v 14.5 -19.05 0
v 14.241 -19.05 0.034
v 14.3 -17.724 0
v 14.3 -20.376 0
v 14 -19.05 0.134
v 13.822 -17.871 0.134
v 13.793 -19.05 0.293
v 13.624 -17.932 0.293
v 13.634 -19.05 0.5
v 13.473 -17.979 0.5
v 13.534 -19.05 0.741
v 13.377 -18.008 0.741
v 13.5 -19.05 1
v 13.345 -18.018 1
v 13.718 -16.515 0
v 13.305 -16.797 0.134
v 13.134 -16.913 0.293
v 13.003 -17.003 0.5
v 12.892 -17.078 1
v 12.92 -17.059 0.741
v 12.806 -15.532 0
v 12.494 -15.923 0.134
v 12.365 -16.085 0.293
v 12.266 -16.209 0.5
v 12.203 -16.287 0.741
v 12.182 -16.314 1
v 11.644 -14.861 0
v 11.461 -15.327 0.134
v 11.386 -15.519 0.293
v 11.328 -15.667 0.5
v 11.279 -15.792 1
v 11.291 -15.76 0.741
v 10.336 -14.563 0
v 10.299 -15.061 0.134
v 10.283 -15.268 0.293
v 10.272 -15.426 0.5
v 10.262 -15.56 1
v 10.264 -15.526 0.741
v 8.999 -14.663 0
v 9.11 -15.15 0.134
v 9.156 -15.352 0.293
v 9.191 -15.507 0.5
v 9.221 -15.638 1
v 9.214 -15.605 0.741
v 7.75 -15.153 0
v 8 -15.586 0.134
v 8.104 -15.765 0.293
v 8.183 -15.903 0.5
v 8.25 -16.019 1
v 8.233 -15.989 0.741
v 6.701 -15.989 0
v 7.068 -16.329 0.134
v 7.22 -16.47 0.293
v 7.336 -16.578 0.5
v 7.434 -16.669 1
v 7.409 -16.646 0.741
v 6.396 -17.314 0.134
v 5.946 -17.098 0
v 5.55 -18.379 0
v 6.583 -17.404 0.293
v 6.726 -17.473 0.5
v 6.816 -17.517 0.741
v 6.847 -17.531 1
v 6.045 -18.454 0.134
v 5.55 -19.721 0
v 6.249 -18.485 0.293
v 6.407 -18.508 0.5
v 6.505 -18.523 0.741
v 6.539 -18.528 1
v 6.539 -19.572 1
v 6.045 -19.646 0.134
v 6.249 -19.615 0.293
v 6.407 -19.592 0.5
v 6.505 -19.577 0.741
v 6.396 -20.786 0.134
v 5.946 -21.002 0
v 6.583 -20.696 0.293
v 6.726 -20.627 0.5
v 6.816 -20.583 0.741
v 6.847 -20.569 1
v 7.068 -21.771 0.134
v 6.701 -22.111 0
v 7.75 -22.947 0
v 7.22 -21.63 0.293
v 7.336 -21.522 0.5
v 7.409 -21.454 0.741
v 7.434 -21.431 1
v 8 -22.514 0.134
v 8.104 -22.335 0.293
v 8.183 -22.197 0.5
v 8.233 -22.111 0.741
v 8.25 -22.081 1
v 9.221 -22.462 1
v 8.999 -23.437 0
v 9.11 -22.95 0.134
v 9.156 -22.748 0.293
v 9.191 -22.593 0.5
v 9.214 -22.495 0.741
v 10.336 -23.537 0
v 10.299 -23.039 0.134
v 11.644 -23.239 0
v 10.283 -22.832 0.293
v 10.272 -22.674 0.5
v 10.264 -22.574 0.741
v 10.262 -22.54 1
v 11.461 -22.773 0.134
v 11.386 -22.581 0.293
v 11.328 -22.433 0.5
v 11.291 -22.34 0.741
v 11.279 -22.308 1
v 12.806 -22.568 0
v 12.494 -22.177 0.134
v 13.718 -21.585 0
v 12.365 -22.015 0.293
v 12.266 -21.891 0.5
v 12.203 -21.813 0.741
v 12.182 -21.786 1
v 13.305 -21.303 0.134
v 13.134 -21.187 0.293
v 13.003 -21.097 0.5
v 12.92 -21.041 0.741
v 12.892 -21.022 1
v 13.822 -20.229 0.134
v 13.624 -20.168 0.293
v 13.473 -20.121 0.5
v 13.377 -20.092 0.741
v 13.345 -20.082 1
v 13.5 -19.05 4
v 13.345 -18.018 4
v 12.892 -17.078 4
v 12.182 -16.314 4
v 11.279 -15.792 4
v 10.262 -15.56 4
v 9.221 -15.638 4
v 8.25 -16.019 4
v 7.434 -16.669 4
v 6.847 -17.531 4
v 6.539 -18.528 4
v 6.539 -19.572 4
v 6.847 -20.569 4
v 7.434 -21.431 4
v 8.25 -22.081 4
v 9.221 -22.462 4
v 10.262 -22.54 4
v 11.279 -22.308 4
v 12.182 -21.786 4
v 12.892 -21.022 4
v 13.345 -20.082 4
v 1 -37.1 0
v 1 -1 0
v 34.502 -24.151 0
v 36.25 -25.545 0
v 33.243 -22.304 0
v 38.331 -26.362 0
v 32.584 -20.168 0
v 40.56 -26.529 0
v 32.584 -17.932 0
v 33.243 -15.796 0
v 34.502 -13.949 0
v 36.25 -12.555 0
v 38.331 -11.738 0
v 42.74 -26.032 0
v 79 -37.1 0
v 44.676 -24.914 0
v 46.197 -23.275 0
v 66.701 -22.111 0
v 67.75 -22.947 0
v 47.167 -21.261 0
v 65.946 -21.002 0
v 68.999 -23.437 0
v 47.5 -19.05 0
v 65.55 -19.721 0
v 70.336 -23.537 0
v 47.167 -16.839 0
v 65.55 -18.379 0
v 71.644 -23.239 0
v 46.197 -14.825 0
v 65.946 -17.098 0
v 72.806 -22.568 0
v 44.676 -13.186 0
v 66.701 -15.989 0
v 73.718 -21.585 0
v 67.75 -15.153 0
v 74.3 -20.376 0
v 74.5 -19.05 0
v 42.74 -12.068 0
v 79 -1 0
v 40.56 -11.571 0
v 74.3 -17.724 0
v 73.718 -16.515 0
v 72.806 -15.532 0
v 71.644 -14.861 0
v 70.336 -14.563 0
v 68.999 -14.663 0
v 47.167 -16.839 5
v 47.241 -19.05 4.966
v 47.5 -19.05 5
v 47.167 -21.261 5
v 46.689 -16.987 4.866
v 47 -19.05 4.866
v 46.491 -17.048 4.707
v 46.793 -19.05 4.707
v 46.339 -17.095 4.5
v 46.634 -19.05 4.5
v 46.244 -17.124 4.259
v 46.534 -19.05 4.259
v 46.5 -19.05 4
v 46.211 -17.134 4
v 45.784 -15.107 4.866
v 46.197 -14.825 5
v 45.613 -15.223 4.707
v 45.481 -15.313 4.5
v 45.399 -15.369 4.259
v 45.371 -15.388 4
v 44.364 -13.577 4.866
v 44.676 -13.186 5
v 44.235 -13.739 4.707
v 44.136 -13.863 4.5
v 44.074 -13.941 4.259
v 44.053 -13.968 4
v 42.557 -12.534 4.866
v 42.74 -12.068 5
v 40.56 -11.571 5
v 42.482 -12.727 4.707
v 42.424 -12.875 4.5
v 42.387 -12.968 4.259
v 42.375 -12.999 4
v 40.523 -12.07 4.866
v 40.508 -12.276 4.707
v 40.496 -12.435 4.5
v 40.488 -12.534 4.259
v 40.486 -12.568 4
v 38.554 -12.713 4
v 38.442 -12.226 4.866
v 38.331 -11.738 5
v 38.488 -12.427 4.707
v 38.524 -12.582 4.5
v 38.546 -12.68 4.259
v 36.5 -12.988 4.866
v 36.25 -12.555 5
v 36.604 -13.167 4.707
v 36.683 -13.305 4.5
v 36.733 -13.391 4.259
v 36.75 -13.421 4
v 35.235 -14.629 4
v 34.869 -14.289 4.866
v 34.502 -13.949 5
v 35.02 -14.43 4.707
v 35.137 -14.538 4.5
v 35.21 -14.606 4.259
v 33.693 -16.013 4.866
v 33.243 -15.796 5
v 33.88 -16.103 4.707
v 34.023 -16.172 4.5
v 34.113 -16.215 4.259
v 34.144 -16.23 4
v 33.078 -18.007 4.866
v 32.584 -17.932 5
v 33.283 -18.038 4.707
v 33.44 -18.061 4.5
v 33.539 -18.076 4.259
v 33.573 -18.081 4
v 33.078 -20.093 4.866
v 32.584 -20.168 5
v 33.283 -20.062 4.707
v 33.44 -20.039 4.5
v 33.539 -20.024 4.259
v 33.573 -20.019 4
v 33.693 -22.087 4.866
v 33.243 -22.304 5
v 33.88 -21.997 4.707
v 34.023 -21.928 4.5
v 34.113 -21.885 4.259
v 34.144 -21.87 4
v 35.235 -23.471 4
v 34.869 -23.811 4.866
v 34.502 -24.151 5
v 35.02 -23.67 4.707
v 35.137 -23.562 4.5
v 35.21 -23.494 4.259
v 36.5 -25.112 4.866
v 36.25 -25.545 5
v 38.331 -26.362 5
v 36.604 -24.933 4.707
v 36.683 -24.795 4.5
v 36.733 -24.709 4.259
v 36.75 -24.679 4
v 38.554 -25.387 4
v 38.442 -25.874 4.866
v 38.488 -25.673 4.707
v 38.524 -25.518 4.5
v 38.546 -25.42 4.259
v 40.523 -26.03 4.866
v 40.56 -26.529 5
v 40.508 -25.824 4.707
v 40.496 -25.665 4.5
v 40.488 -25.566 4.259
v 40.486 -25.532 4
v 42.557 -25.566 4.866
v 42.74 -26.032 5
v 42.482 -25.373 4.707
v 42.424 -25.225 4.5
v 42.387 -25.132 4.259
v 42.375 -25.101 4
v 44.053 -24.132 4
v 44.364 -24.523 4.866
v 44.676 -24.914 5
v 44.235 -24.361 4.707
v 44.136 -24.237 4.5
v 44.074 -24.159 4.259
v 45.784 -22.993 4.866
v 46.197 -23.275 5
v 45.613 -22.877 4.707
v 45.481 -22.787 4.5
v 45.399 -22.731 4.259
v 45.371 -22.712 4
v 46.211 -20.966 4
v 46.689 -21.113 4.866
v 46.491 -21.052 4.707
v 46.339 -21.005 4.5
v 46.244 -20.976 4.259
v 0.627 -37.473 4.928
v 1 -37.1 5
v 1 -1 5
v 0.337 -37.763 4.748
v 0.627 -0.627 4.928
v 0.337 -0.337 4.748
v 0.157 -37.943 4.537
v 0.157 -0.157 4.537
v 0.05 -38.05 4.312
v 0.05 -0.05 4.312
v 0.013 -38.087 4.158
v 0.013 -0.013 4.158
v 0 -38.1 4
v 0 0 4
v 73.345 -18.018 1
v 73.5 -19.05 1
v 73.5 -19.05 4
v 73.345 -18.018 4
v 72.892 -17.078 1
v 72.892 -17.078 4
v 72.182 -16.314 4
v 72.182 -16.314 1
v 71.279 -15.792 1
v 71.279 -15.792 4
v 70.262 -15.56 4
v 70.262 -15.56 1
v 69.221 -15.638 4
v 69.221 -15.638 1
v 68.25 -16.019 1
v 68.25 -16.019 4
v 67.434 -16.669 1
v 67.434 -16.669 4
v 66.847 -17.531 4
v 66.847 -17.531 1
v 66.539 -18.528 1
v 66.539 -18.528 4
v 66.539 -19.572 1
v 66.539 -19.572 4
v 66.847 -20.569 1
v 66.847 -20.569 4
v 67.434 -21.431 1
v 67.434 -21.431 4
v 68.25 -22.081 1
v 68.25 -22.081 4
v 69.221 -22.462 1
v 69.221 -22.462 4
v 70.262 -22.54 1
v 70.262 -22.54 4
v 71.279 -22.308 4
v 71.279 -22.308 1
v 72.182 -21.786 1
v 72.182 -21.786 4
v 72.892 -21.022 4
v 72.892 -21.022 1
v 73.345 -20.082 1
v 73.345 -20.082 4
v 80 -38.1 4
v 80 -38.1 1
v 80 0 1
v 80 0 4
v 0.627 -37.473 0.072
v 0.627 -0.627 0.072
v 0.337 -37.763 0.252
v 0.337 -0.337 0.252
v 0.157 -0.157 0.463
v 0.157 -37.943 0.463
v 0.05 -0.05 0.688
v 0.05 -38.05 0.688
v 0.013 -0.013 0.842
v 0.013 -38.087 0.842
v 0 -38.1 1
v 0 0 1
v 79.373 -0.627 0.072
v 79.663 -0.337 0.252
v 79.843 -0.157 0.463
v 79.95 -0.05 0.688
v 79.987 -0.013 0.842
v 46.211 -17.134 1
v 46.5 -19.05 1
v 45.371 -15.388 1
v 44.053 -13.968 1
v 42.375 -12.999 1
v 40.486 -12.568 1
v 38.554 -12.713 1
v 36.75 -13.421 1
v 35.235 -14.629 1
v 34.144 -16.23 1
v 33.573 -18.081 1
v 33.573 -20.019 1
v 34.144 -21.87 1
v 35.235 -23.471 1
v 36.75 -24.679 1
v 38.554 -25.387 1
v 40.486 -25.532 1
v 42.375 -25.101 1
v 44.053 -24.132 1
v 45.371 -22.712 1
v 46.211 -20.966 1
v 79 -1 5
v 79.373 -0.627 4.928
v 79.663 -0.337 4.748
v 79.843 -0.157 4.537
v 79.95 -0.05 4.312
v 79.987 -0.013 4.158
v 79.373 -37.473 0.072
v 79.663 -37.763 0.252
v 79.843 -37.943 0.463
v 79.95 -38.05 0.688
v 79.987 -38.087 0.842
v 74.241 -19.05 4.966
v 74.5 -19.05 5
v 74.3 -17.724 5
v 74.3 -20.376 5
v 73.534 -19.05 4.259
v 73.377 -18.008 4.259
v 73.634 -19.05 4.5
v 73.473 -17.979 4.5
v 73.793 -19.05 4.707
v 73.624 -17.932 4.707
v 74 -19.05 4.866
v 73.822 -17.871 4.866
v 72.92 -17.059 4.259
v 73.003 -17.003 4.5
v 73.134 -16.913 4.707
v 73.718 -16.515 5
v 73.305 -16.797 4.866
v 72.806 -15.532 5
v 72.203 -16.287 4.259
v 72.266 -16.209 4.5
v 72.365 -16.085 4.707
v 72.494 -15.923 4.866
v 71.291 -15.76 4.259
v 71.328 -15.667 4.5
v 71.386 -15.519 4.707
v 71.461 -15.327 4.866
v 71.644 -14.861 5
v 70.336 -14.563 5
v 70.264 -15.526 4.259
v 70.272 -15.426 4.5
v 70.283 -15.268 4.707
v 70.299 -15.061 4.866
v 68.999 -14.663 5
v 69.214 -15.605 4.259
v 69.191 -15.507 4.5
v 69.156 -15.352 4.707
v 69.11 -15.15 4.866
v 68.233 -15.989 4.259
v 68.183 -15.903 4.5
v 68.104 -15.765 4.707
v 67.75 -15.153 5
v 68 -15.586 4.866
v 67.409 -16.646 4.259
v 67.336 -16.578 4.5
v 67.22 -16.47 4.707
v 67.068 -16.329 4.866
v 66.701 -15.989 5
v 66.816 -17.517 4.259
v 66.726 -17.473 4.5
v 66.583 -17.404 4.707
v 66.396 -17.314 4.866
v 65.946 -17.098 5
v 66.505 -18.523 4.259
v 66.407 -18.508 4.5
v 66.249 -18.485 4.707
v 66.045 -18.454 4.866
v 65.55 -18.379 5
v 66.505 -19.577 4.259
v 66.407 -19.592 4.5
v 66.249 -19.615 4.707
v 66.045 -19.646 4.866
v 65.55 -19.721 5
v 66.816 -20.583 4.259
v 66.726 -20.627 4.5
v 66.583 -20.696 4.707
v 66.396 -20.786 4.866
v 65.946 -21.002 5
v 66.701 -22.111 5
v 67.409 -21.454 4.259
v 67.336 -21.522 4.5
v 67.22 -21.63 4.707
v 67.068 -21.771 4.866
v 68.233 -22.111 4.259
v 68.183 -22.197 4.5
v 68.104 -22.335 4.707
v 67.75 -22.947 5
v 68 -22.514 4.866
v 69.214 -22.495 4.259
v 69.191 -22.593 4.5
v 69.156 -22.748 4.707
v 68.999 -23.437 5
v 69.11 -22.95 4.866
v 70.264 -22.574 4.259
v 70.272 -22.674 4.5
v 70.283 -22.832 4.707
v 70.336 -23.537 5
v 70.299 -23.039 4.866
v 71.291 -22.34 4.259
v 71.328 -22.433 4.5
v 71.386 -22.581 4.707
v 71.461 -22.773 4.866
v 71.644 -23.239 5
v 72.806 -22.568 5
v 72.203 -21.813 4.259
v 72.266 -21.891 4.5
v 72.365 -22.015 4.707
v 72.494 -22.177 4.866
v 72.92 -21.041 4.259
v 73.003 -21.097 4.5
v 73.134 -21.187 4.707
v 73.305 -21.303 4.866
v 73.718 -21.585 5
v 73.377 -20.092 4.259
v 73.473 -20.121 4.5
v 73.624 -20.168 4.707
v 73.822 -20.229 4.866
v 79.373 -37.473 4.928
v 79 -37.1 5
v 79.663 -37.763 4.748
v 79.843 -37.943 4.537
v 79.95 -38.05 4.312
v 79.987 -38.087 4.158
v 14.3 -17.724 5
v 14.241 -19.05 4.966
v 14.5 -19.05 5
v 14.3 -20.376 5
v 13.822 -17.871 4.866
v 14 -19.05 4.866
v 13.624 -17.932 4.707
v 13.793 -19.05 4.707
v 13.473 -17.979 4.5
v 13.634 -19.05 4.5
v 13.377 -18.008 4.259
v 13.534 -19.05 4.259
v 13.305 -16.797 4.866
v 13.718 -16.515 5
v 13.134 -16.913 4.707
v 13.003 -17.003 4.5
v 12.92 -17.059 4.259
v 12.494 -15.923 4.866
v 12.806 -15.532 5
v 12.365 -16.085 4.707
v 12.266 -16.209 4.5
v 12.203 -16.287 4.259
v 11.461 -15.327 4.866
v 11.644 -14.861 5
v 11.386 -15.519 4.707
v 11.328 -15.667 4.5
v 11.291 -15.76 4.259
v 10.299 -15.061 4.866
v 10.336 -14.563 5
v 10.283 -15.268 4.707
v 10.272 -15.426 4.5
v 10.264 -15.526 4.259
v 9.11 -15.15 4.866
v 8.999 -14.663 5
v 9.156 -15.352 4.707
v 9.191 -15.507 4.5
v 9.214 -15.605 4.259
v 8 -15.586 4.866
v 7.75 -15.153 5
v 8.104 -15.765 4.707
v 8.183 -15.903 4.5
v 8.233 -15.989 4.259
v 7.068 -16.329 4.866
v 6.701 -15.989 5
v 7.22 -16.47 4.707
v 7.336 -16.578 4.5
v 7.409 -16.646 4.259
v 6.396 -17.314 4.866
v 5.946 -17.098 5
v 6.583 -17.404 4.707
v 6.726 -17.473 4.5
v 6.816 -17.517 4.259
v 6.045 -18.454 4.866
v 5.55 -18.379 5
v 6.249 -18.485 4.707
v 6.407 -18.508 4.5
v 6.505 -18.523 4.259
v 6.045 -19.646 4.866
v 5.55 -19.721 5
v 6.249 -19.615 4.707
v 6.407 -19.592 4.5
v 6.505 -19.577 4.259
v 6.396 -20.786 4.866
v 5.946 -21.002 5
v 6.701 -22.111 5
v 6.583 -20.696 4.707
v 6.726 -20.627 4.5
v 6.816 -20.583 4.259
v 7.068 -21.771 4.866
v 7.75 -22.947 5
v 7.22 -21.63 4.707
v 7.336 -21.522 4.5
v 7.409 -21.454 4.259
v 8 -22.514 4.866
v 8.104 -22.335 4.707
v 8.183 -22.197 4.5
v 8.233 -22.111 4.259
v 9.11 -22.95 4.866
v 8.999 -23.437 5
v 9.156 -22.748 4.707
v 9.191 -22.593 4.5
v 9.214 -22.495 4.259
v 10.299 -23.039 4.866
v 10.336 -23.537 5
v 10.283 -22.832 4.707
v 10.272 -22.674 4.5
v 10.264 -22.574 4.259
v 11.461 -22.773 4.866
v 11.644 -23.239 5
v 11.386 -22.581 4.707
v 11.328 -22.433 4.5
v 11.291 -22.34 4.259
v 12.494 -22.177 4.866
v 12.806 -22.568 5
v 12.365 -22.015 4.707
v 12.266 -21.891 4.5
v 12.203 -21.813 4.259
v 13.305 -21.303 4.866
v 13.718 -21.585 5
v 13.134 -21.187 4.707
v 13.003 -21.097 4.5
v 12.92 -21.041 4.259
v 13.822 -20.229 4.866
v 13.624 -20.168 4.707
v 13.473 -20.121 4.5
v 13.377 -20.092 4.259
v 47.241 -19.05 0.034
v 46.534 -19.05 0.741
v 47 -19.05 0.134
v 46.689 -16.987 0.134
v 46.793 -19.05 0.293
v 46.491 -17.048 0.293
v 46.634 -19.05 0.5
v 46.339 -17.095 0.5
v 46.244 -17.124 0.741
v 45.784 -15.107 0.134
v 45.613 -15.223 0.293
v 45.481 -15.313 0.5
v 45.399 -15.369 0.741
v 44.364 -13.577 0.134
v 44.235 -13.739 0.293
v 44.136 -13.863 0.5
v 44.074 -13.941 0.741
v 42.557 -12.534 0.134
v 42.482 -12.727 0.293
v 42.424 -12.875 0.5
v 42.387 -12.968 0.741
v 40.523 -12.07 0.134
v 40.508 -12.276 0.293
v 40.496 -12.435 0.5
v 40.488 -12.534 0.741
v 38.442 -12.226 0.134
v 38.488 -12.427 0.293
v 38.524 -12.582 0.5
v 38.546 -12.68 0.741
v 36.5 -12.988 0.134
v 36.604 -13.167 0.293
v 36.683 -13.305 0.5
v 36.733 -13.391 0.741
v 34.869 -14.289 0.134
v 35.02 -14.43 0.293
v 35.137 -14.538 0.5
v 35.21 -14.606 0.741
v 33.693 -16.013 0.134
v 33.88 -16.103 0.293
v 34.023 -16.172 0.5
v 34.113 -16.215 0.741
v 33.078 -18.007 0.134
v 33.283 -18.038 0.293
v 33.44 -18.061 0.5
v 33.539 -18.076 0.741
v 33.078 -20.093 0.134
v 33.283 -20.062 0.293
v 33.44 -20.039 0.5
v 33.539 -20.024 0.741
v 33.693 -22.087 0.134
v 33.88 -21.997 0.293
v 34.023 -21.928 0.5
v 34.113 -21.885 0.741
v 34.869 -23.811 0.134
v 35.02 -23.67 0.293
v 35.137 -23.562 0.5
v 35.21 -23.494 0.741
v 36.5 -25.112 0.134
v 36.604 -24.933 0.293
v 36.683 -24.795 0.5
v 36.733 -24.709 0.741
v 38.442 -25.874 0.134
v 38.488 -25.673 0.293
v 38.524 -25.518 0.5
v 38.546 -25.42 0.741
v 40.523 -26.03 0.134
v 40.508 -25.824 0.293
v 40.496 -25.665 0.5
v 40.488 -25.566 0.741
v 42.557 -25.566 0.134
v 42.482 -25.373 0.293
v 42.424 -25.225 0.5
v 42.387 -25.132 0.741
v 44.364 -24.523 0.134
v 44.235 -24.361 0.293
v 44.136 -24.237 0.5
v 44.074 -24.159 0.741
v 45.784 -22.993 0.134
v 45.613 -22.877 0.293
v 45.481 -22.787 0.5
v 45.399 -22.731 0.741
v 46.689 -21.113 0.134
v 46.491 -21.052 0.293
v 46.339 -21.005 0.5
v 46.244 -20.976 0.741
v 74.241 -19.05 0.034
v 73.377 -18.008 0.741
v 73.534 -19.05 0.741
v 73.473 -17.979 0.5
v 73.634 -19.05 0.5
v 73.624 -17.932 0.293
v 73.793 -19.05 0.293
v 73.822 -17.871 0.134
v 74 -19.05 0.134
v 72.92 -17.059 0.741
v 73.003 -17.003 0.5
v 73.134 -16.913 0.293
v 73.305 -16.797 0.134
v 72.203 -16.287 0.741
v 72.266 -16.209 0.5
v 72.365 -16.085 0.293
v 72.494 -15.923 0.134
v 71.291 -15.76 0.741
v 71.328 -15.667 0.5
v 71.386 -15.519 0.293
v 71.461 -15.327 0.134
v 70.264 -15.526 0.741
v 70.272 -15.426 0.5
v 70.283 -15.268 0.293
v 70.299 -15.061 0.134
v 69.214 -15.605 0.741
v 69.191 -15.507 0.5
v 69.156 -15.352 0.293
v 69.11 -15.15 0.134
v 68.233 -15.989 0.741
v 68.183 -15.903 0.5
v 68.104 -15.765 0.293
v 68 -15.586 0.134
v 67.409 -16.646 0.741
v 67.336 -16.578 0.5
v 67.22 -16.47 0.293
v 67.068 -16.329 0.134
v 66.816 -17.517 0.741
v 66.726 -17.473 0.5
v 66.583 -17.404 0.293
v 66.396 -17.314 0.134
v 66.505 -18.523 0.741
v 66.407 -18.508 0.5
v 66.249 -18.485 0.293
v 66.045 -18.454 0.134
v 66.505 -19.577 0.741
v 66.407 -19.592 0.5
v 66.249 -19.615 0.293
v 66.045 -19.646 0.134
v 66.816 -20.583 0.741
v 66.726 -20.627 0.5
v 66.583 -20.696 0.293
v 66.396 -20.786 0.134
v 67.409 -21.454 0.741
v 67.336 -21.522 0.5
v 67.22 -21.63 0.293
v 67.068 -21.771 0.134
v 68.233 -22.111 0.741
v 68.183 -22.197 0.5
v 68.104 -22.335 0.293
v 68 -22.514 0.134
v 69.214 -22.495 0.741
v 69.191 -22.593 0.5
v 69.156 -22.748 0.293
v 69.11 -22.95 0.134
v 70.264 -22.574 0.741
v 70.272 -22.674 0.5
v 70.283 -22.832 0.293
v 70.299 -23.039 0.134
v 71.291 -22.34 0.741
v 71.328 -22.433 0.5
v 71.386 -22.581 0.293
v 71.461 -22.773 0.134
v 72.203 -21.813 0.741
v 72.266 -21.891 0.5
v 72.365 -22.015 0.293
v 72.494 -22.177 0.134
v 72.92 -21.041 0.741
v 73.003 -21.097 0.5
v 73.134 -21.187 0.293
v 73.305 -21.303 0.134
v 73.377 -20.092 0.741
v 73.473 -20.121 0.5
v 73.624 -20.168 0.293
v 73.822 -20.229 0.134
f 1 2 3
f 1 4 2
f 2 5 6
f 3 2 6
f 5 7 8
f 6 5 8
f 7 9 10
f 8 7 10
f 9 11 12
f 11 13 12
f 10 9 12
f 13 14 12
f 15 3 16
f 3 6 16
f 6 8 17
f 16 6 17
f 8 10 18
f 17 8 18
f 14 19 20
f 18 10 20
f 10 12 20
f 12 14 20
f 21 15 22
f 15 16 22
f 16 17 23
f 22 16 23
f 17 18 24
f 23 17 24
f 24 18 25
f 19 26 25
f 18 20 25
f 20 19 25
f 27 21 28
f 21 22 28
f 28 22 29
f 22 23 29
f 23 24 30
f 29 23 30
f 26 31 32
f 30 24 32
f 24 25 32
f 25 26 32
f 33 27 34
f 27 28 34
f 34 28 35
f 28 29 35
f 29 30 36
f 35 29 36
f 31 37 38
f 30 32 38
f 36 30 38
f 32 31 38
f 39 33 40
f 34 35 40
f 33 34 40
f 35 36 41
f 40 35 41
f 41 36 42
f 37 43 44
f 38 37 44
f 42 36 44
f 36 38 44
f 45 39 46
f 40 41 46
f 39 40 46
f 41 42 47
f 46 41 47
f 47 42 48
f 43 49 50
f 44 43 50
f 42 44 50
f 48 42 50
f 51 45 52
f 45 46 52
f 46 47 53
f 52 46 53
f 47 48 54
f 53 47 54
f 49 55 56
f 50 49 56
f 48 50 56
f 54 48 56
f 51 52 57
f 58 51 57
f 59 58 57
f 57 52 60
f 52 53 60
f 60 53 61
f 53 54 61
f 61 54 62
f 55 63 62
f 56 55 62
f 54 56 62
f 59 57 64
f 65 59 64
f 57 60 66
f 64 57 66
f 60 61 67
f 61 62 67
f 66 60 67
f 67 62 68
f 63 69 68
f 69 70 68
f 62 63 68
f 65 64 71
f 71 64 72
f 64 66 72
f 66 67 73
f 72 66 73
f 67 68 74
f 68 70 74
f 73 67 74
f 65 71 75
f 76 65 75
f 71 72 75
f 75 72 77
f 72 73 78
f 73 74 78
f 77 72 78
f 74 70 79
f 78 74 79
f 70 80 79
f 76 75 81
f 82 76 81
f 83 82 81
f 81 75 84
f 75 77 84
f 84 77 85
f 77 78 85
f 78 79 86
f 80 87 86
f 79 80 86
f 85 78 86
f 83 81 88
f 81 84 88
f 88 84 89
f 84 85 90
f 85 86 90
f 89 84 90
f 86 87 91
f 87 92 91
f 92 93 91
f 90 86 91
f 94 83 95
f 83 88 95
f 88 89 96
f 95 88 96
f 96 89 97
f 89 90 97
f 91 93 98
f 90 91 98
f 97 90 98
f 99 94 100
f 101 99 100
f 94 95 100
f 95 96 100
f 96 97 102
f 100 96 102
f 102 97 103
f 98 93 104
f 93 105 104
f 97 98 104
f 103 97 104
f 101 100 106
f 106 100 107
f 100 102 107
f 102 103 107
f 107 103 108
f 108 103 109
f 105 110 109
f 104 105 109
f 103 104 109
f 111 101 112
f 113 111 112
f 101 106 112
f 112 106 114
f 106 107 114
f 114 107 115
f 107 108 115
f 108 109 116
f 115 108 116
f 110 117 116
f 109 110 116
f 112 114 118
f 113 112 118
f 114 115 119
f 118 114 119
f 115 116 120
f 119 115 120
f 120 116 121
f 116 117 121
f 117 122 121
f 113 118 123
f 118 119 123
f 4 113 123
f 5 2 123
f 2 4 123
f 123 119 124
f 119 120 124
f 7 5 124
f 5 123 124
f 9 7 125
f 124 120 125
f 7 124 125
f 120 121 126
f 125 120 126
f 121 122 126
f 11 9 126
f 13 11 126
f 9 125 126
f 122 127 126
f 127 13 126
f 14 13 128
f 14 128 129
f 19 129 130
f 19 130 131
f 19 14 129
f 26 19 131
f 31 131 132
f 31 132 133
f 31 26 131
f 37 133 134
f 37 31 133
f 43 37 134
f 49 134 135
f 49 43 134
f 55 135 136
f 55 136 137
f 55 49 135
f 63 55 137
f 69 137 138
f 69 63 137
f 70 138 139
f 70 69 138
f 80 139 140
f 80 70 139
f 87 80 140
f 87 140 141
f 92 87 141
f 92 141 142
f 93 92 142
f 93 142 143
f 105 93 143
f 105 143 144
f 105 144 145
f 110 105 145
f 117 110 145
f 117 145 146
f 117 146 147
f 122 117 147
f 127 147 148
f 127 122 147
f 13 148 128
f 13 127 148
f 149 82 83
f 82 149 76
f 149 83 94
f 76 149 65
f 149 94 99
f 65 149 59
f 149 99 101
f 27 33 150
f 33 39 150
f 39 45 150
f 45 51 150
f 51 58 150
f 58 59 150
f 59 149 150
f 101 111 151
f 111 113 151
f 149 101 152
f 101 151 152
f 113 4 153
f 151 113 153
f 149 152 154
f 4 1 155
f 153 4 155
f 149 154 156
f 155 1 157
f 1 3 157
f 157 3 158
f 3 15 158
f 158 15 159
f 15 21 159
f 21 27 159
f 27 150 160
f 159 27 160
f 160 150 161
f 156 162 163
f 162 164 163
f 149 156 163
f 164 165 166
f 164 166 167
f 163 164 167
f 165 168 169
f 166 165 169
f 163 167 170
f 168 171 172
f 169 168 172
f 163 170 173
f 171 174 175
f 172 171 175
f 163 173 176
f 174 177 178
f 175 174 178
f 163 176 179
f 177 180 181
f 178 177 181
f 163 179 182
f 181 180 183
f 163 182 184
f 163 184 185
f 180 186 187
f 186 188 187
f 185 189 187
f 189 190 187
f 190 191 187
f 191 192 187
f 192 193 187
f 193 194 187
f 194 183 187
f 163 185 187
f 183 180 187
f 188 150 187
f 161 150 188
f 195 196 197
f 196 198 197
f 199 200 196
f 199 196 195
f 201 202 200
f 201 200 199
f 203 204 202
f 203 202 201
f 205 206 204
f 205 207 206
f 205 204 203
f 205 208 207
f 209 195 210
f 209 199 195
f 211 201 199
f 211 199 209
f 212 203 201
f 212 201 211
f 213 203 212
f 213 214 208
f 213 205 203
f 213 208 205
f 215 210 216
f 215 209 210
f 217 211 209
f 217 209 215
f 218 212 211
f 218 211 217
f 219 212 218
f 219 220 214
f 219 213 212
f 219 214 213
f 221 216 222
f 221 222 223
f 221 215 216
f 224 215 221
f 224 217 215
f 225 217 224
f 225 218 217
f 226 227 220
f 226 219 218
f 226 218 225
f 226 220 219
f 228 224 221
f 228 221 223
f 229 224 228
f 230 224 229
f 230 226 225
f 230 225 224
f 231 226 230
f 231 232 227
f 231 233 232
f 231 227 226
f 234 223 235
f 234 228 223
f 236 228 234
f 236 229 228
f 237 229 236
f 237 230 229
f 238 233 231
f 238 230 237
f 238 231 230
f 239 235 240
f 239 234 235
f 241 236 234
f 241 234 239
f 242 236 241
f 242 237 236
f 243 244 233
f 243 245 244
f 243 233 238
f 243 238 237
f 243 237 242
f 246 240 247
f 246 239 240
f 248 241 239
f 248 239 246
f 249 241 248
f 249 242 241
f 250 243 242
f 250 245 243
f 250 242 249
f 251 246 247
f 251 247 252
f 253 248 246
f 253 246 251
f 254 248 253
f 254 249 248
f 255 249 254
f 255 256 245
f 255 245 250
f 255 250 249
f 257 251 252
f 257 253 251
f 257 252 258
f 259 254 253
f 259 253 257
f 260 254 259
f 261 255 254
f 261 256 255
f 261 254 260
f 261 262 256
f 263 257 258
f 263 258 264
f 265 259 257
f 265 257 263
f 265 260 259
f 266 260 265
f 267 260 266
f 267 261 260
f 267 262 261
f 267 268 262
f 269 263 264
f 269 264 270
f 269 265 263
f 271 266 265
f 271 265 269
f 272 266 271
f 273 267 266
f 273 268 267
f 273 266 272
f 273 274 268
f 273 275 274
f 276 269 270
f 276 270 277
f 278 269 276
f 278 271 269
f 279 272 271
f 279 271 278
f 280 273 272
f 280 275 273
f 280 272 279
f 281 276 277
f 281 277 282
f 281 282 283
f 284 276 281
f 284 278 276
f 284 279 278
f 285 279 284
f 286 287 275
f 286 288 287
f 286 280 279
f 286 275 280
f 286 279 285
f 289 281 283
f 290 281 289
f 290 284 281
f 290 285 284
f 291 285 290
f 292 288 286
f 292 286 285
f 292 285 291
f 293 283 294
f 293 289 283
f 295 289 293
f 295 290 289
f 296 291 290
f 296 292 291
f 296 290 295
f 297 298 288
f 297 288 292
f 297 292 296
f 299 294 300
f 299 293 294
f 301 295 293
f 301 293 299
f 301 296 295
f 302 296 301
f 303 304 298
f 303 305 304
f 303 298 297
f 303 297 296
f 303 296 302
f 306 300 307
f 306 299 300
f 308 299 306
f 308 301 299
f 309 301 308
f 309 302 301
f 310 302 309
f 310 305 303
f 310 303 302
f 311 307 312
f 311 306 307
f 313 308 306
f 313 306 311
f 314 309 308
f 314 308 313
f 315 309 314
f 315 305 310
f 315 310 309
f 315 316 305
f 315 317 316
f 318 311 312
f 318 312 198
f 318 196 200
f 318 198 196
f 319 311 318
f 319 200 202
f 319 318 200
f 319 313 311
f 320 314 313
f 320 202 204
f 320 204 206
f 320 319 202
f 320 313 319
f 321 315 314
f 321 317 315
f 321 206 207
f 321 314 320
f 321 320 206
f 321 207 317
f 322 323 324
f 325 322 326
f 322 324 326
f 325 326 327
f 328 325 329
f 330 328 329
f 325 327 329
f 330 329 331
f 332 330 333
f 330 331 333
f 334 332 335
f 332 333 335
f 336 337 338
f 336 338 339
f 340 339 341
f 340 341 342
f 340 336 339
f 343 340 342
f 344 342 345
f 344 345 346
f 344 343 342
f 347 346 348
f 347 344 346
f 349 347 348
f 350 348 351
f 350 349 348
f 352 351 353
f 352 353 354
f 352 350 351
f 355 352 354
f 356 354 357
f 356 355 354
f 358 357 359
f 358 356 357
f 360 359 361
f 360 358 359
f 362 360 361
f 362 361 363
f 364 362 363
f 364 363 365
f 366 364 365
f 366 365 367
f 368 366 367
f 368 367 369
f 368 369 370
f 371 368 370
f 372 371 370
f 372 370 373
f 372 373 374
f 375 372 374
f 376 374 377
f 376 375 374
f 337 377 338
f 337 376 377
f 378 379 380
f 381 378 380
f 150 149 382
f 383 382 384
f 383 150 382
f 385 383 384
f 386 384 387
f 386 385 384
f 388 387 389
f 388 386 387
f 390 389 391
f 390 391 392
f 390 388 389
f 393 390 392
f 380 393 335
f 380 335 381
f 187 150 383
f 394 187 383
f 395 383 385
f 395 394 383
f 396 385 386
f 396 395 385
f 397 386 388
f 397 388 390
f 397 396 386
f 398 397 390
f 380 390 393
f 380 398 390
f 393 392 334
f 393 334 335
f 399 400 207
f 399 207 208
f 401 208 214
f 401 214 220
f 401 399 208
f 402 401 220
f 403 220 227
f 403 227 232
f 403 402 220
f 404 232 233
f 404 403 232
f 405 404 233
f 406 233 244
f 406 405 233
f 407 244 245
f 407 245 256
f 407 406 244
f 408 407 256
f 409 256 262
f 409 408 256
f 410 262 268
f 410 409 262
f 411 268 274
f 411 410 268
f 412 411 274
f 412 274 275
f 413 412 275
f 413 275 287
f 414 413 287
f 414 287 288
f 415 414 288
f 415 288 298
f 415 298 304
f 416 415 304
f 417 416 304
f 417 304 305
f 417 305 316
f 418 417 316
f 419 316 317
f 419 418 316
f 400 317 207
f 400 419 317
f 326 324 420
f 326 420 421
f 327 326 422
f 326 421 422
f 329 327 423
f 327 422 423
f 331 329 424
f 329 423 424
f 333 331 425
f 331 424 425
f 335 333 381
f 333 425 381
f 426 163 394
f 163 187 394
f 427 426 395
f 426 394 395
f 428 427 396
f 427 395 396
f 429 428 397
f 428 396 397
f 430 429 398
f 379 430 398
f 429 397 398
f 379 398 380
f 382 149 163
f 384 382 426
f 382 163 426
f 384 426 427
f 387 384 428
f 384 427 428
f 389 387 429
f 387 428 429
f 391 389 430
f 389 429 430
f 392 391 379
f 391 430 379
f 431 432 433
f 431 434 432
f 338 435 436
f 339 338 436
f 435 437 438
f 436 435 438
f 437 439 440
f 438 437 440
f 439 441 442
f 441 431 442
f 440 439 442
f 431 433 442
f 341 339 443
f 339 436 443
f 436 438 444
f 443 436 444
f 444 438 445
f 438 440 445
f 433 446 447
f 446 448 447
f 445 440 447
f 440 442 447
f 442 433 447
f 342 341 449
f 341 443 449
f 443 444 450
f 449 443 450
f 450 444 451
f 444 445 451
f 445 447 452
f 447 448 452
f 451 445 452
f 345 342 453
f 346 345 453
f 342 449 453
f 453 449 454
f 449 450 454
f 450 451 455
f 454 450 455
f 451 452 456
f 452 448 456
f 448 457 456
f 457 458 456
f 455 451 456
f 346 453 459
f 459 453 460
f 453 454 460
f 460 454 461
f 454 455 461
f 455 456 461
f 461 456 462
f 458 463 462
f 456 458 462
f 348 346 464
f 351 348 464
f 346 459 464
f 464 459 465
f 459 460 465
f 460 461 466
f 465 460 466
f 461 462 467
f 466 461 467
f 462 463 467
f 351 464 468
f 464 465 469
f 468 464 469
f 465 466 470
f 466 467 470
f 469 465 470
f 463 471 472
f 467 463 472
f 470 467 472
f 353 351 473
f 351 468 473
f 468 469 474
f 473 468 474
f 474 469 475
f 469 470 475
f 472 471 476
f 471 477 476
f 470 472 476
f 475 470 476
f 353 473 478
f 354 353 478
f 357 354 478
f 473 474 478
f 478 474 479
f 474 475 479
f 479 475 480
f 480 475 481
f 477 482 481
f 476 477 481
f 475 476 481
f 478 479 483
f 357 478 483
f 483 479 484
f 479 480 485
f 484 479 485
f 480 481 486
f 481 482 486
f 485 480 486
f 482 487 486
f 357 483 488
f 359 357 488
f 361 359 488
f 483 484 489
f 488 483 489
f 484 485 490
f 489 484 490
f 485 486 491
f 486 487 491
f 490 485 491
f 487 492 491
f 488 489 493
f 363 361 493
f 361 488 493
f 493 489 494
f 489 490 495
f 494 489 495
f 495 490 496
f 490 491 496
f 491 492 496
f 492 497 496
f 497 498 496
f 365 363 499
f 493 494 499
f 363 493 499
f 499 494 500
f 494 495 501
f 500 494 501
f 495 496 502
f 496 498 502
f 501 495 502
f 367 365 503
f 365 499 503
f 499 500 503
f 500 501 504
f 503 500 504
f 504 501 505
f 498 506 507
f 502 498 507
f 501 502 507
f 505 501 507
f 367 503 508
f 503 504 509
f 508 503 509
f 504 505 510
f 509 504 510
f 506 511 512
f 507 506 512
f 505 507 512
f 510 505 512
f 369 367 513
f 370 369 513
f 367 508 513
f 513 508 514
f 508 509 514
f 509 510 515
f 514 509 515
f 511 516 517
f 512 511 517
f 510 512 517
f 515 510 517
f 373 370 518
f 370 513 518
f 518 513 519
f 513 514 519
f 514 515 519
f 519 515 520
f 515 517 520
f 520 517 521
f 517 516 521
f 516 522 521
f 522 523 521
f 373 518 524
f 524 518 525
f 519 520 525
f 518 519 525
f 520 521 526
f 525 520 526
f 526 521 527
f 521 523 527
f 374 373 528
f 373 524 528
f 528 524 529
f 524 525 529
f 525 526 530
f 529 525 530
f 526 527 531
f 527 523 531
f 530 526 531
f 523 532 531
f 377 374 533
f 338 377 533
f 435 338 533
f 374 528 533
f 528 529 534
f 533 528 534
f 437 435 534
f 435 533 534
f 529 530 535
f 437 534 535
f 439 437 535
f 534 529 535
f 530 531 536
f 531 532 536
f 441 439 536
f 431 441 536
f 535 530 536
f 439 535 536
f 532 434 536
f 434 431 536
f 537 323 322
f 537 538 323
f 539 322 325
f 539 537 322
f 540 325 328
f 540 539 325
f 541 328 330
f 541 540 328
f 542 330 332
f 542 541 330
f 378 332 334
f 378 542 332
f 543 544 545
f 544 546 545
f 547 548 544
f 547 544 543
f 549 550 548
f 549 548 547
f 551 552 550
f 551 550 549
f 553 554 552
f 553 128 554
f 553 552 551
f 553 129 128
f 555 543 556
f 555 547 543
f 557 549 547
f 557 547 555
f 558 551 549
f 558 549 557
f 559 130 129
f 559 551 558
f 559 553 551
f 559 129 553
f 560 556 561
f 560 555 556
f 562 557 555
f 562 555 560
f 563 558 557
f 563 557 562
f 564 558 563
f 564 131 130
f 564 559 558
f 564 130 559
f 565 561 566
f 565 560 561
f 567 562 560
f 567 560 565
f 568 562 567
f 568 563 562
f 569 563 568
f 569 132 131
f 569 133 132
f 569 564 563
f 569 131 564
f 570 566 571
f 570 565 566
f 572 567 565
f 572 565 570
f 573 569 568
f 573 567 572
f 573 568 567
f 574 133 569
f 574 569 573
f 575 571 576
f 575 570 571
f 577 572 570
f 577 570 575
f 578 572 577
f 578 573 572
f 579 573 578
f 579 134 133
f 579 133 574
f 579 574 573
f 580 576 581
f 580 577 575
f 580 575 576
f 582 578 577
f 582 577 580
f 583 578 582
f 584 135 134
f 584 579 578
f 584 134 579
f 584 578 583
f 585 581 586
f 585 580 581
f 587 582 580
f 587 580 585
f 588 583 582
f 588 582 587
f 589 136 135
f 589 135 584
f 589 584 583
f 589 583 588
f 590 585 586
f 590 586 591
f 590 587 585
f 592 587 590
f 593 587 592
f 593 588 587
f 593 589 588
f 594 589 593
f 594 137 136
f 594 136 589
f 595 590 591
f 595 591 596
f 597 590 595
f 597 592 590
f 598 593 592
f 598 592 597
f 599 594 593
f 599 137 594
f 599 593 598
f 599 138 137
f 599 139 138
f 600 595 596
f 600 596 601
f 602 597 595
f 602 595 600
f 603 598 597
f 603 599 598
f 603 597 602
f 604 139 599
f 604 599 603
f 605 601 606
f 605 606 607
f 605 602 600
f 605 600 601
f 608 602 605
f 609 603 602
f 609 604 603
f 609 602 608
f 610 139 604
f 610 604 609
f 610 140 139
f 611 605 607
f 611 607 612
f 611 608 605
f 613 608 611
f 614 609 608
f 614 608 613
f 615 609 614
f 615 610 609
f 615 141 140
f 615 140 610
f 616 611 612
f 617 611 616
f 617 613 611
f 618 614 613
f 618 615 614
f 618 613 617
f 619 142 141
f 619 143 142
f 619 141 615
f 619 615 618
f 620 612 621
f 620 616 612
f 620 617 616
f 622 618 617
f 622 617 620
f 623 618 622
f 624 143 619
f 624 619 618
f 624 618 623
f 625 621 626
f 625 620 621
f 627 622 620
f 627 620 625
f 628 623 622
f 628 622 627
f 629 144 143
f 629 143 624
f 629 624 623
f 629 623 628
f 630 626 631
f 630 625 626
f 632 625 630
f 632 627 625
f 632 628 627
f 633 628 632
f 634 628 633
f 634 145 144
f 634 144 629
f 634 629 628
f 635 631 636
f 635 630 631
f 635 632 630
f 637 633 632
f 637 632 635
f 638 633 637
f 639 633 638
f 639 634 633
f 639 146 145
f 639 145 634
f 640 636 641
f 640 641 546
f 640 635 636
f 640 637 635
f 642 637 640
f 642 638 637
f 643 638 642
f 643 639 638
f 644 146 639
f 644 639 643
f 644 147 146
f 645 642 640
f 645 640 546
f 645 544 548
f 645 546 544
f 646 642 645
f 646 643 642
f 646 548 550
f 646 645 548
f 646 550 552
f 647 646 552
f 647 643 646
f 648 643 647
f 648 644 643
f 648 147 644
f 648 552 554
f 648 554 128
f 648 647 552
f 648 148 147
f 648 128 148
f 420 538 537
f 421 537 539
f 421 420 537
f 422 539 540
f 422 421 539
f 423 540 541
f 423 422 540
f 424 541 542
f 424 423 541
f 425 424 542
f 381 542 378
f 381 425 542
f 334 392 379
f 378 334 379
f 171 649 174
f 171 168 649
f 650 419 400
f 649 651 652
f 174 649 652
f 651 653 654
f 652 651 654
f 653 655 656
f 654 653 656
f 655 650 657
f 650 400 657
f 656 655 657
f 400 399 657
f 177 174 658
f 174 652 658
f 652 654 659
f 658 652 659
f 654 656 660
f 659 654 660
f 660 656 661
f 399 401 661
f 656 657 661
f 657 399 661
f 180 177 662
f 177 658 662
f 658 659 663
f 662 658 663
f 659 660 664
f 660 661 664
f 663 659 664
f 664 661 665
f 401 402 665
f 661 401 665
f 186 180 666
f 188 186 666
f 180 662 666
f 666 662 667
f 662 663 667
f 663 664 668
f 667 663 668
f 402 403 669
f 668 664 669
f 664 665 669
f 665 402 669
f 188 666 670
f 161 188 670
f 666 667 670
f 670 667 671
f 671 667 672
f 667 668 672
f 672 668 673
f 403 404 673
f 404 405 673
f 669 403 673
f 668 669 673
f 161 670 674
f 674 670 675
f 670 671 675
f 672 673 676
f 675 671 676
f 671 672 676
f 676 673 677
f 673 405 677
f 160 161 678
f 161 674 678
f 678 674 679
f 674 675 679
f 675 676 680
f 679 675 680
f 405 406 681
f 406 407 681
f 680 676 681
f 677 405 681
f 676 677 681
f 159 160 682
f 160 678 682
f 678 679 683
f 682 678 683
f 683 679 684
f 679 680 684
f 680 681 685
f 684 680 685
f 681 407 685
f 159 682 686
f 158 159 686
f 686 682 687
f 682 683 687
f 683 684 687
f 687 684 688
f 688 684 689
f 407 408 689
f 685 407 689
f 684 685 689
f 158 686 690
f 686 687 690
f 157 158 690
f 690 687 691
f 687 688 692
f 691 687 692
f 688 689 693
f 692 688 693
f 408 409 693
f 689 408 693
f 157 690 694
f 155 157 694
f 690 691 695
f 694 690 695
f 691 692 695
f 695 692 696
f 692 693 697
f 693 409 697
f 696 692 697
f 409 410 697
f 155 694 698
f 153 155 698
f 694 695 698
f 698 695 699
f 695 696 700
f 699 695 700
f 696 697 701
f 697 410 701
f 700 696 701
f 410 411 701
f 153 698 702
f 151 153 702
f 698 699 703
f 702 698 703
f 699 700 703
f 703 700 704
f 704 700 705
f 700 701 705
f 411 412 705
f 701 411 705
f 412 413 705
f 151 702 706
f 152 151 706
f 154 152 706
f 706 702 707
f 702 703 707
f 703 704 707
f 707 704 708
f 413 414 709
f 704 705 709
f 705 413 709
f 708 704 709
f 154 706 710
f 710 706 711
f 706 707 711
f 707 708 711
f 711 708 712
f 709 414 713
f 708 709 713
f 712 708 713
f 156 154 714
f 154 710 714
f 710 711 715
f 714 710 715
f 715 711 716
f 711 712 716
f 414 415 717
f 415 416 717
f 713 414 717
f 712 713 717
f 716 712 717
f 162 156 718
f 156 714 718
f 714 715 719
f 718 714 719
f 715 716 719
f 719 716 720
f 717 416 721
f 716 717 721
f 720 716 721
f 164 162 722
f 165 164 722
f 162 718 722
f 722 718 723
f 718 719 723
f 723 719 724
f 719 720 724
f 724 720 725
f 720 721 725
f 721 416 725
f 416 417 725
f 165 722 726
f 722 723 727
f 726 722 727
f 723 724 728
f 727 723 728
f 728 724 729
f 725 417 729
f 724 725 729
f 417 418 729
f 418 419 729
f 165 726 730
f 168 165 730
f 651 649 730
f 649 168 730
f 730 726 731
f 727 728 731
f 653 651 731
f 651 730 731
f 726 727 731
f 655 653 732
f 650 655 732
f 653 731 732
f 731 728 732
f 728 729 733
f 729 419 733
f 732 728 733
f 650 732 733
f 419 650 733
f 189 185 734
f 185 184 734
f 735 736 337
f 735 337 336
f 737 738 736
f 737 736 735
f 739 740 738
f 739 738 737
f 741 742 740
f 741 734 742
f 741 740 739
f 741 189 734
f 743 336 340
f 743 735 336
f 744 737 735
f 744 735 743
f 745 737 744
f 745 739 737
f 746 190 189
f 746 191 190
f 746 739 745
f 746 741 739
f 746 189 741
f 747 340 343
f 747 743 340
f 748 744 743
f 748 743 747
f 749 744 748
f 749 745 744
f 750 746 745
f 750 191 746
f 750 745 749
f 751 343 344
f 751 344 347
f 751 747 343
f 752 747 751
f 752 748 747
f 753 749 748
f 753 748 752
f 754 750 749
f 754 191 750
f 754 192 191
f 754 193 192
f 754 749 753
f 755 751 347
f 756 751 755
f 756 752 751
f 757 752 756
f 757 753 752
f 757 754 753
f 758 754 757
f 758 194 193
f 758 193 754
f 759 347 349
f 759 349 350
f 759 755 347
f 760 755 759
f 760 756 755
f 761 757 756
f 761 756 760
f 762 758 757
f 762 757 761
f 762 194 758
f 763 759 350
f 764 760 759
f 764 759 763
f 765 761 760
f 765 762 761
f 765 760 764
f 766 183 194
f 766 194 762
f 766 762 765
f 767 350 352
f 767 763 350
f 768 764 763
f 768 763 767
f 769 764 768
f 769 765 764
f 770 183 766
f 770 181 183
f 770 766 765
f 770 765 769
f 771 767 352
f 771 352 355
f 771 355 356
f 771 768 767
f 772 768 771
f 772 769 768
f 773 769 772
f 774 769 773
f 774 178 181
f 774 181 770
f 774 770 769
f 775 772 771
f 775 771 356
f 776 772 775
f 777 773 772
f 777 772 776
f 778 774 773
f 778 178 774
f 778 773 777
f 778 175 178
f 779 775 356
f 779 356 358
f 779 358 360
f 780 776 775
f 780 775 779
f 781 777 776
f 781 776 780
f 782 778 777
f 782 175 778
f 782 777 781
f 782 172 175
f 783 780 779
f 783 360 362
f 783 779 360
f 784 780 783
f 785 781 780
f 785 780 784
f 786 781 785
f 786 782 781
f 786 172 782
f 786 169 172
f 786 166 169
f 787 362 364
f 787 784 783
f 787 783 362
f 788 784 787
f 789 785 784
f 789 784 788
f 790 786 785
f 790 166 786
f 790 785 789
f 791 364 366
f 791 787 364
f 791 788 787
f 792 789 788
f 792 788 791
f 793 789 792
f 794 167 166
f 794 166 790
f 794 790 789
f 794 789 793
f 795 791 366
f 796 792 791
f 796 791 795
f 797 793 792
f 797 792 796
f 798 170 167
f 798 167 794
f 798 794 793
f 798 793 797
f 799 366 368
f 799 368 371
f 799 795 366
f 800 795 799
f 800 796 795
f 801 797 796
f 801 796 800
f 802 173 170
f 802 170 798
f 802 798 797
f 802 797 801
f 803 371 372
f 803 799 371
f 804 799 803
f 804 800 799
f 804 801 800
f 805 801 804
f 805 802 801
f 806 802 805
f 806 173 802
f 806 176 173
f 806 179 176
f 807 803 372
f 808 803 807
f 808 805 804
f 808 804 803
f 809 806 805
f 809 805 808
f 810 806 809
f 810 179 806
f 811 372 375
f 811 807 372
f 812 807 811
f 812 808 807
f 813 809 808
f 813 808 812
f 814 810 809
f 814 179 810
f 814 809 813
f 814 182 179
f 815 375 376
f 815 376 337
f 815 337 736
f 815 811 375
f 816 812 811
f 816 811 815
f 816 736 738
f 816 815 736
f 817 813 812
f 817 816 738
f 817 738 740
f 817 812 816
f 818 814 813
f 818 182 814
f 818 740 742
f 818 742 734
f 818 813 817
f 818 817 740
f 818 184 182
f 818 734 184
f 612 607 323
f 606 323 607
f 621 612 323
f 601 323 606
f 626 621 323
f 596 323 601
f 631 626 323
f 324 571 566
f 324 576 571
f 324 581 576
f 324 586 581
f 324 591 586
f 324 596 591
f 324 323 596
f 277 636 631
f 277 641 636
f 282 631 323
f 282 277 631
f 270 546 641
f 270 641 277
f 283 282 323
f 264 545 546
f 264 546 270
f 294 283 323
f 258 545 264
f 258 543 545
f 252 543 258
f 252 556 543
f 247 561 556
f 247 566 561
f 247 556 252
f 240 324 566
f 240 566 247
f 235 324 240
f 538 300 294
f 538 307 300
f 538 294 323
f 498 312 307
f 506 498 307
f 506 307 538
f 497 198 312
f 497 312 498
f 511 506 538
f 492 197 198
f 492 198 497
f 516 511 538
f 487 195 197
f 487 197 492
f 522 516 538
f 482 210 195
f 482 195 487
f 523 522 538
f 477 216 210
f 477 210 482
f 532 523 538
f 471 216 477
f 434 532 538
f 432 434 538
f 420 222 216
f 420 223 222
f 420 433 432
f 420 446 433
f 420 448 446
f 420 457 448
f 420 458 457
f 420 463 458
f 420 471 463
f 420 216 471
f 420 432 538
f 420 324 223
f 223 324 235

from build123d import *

# Parameters (mm, degrees)
SKETCH2_W           = 80
SKETCH2_H           = 38.1
SKETCH2_R           = 5
SKETCH2_R_2         = 10.5
SKETCH2_R_3         = 6.5
SKETCH2_R_4         = 3.5
BOSS_EXTRUDE1_DEPTH = 5
FILLET1_R           = 1


with BuildPart() as part:
    # Sketch2 → Boss-Extrude1 (new body)
    # profile 1 of 4: a face of its own
    with BuildSketch(Plane.XY):
        with Locations((40, -19.05)):
            Rectangle(SKETCH2_W, SKETCH2_H)
        with Locations((70, -19.05)):
            Circle(SKETCH2_R, mode=Mode.SUBTRACT)
        with Locations((10, -19.05)):
            Circle(SKETCH2_R, mode=Mode.SUBTRACT)
        with Locations((40, -19.05)):
            Circle(SKETCH2_R_2, mode=Mode.SUBTRACT)
    # profile 2 of 4: a face of its own
    with BuildSketch(Plane.XY):
        with Locations((40, -19.05)):
            Circle(SKETCH2_R_2)
        with Locations((40, -19.05)):
            Circle(SKETCH2_R_3, mode=Mode.SUBTRACT)
    # profile 3 of 4: a face of its own
    with BuildSketch(Plane.XY):
        with Locations((10, -19.05)):
            Circle(SKETCH2_R)
        with Locations((10, -19.05)):
            Circle(SKETCH2_R_4, mode=Mode.SUBTRACT)
    # profile 4 of 4: a face of its own
    with BuildSketch(Plane.XY):
        with Locations((70, -19.05)):
            Circle(SKETCH2_R)
        with Locations((70, -19.05)):
            Circle(SKETCH2_R_4, mode=Mode.SUBTRACT)
    extrude(amount=BOSS_EXTRUDE1_DEPTH)

    # Fillet1
    fillet1_edges = [part.edges().sort_by_distance(p)[0] for p in [
        (33.5, -19.05, 0),
        (40, -38.1, 0),
        (0, -19.05, 0),
        (40, 0, 0),
        (80, -19.05, 0),
        (40, 0, 5),
        (0, -19.05, 5),
        (40, -38.1, 5),
        (33.5, -19.05, 5),
        (6.5, -19.05, 5),
        (66.5, -19.05, 5),
        (80, -19.05, 5),
        (66.5, -19.05, 0),
        (6.5, -19.05, 0),
    ]]
    fillet(fillet1_edges, radius=FILLET1_R)


solid = part.part
